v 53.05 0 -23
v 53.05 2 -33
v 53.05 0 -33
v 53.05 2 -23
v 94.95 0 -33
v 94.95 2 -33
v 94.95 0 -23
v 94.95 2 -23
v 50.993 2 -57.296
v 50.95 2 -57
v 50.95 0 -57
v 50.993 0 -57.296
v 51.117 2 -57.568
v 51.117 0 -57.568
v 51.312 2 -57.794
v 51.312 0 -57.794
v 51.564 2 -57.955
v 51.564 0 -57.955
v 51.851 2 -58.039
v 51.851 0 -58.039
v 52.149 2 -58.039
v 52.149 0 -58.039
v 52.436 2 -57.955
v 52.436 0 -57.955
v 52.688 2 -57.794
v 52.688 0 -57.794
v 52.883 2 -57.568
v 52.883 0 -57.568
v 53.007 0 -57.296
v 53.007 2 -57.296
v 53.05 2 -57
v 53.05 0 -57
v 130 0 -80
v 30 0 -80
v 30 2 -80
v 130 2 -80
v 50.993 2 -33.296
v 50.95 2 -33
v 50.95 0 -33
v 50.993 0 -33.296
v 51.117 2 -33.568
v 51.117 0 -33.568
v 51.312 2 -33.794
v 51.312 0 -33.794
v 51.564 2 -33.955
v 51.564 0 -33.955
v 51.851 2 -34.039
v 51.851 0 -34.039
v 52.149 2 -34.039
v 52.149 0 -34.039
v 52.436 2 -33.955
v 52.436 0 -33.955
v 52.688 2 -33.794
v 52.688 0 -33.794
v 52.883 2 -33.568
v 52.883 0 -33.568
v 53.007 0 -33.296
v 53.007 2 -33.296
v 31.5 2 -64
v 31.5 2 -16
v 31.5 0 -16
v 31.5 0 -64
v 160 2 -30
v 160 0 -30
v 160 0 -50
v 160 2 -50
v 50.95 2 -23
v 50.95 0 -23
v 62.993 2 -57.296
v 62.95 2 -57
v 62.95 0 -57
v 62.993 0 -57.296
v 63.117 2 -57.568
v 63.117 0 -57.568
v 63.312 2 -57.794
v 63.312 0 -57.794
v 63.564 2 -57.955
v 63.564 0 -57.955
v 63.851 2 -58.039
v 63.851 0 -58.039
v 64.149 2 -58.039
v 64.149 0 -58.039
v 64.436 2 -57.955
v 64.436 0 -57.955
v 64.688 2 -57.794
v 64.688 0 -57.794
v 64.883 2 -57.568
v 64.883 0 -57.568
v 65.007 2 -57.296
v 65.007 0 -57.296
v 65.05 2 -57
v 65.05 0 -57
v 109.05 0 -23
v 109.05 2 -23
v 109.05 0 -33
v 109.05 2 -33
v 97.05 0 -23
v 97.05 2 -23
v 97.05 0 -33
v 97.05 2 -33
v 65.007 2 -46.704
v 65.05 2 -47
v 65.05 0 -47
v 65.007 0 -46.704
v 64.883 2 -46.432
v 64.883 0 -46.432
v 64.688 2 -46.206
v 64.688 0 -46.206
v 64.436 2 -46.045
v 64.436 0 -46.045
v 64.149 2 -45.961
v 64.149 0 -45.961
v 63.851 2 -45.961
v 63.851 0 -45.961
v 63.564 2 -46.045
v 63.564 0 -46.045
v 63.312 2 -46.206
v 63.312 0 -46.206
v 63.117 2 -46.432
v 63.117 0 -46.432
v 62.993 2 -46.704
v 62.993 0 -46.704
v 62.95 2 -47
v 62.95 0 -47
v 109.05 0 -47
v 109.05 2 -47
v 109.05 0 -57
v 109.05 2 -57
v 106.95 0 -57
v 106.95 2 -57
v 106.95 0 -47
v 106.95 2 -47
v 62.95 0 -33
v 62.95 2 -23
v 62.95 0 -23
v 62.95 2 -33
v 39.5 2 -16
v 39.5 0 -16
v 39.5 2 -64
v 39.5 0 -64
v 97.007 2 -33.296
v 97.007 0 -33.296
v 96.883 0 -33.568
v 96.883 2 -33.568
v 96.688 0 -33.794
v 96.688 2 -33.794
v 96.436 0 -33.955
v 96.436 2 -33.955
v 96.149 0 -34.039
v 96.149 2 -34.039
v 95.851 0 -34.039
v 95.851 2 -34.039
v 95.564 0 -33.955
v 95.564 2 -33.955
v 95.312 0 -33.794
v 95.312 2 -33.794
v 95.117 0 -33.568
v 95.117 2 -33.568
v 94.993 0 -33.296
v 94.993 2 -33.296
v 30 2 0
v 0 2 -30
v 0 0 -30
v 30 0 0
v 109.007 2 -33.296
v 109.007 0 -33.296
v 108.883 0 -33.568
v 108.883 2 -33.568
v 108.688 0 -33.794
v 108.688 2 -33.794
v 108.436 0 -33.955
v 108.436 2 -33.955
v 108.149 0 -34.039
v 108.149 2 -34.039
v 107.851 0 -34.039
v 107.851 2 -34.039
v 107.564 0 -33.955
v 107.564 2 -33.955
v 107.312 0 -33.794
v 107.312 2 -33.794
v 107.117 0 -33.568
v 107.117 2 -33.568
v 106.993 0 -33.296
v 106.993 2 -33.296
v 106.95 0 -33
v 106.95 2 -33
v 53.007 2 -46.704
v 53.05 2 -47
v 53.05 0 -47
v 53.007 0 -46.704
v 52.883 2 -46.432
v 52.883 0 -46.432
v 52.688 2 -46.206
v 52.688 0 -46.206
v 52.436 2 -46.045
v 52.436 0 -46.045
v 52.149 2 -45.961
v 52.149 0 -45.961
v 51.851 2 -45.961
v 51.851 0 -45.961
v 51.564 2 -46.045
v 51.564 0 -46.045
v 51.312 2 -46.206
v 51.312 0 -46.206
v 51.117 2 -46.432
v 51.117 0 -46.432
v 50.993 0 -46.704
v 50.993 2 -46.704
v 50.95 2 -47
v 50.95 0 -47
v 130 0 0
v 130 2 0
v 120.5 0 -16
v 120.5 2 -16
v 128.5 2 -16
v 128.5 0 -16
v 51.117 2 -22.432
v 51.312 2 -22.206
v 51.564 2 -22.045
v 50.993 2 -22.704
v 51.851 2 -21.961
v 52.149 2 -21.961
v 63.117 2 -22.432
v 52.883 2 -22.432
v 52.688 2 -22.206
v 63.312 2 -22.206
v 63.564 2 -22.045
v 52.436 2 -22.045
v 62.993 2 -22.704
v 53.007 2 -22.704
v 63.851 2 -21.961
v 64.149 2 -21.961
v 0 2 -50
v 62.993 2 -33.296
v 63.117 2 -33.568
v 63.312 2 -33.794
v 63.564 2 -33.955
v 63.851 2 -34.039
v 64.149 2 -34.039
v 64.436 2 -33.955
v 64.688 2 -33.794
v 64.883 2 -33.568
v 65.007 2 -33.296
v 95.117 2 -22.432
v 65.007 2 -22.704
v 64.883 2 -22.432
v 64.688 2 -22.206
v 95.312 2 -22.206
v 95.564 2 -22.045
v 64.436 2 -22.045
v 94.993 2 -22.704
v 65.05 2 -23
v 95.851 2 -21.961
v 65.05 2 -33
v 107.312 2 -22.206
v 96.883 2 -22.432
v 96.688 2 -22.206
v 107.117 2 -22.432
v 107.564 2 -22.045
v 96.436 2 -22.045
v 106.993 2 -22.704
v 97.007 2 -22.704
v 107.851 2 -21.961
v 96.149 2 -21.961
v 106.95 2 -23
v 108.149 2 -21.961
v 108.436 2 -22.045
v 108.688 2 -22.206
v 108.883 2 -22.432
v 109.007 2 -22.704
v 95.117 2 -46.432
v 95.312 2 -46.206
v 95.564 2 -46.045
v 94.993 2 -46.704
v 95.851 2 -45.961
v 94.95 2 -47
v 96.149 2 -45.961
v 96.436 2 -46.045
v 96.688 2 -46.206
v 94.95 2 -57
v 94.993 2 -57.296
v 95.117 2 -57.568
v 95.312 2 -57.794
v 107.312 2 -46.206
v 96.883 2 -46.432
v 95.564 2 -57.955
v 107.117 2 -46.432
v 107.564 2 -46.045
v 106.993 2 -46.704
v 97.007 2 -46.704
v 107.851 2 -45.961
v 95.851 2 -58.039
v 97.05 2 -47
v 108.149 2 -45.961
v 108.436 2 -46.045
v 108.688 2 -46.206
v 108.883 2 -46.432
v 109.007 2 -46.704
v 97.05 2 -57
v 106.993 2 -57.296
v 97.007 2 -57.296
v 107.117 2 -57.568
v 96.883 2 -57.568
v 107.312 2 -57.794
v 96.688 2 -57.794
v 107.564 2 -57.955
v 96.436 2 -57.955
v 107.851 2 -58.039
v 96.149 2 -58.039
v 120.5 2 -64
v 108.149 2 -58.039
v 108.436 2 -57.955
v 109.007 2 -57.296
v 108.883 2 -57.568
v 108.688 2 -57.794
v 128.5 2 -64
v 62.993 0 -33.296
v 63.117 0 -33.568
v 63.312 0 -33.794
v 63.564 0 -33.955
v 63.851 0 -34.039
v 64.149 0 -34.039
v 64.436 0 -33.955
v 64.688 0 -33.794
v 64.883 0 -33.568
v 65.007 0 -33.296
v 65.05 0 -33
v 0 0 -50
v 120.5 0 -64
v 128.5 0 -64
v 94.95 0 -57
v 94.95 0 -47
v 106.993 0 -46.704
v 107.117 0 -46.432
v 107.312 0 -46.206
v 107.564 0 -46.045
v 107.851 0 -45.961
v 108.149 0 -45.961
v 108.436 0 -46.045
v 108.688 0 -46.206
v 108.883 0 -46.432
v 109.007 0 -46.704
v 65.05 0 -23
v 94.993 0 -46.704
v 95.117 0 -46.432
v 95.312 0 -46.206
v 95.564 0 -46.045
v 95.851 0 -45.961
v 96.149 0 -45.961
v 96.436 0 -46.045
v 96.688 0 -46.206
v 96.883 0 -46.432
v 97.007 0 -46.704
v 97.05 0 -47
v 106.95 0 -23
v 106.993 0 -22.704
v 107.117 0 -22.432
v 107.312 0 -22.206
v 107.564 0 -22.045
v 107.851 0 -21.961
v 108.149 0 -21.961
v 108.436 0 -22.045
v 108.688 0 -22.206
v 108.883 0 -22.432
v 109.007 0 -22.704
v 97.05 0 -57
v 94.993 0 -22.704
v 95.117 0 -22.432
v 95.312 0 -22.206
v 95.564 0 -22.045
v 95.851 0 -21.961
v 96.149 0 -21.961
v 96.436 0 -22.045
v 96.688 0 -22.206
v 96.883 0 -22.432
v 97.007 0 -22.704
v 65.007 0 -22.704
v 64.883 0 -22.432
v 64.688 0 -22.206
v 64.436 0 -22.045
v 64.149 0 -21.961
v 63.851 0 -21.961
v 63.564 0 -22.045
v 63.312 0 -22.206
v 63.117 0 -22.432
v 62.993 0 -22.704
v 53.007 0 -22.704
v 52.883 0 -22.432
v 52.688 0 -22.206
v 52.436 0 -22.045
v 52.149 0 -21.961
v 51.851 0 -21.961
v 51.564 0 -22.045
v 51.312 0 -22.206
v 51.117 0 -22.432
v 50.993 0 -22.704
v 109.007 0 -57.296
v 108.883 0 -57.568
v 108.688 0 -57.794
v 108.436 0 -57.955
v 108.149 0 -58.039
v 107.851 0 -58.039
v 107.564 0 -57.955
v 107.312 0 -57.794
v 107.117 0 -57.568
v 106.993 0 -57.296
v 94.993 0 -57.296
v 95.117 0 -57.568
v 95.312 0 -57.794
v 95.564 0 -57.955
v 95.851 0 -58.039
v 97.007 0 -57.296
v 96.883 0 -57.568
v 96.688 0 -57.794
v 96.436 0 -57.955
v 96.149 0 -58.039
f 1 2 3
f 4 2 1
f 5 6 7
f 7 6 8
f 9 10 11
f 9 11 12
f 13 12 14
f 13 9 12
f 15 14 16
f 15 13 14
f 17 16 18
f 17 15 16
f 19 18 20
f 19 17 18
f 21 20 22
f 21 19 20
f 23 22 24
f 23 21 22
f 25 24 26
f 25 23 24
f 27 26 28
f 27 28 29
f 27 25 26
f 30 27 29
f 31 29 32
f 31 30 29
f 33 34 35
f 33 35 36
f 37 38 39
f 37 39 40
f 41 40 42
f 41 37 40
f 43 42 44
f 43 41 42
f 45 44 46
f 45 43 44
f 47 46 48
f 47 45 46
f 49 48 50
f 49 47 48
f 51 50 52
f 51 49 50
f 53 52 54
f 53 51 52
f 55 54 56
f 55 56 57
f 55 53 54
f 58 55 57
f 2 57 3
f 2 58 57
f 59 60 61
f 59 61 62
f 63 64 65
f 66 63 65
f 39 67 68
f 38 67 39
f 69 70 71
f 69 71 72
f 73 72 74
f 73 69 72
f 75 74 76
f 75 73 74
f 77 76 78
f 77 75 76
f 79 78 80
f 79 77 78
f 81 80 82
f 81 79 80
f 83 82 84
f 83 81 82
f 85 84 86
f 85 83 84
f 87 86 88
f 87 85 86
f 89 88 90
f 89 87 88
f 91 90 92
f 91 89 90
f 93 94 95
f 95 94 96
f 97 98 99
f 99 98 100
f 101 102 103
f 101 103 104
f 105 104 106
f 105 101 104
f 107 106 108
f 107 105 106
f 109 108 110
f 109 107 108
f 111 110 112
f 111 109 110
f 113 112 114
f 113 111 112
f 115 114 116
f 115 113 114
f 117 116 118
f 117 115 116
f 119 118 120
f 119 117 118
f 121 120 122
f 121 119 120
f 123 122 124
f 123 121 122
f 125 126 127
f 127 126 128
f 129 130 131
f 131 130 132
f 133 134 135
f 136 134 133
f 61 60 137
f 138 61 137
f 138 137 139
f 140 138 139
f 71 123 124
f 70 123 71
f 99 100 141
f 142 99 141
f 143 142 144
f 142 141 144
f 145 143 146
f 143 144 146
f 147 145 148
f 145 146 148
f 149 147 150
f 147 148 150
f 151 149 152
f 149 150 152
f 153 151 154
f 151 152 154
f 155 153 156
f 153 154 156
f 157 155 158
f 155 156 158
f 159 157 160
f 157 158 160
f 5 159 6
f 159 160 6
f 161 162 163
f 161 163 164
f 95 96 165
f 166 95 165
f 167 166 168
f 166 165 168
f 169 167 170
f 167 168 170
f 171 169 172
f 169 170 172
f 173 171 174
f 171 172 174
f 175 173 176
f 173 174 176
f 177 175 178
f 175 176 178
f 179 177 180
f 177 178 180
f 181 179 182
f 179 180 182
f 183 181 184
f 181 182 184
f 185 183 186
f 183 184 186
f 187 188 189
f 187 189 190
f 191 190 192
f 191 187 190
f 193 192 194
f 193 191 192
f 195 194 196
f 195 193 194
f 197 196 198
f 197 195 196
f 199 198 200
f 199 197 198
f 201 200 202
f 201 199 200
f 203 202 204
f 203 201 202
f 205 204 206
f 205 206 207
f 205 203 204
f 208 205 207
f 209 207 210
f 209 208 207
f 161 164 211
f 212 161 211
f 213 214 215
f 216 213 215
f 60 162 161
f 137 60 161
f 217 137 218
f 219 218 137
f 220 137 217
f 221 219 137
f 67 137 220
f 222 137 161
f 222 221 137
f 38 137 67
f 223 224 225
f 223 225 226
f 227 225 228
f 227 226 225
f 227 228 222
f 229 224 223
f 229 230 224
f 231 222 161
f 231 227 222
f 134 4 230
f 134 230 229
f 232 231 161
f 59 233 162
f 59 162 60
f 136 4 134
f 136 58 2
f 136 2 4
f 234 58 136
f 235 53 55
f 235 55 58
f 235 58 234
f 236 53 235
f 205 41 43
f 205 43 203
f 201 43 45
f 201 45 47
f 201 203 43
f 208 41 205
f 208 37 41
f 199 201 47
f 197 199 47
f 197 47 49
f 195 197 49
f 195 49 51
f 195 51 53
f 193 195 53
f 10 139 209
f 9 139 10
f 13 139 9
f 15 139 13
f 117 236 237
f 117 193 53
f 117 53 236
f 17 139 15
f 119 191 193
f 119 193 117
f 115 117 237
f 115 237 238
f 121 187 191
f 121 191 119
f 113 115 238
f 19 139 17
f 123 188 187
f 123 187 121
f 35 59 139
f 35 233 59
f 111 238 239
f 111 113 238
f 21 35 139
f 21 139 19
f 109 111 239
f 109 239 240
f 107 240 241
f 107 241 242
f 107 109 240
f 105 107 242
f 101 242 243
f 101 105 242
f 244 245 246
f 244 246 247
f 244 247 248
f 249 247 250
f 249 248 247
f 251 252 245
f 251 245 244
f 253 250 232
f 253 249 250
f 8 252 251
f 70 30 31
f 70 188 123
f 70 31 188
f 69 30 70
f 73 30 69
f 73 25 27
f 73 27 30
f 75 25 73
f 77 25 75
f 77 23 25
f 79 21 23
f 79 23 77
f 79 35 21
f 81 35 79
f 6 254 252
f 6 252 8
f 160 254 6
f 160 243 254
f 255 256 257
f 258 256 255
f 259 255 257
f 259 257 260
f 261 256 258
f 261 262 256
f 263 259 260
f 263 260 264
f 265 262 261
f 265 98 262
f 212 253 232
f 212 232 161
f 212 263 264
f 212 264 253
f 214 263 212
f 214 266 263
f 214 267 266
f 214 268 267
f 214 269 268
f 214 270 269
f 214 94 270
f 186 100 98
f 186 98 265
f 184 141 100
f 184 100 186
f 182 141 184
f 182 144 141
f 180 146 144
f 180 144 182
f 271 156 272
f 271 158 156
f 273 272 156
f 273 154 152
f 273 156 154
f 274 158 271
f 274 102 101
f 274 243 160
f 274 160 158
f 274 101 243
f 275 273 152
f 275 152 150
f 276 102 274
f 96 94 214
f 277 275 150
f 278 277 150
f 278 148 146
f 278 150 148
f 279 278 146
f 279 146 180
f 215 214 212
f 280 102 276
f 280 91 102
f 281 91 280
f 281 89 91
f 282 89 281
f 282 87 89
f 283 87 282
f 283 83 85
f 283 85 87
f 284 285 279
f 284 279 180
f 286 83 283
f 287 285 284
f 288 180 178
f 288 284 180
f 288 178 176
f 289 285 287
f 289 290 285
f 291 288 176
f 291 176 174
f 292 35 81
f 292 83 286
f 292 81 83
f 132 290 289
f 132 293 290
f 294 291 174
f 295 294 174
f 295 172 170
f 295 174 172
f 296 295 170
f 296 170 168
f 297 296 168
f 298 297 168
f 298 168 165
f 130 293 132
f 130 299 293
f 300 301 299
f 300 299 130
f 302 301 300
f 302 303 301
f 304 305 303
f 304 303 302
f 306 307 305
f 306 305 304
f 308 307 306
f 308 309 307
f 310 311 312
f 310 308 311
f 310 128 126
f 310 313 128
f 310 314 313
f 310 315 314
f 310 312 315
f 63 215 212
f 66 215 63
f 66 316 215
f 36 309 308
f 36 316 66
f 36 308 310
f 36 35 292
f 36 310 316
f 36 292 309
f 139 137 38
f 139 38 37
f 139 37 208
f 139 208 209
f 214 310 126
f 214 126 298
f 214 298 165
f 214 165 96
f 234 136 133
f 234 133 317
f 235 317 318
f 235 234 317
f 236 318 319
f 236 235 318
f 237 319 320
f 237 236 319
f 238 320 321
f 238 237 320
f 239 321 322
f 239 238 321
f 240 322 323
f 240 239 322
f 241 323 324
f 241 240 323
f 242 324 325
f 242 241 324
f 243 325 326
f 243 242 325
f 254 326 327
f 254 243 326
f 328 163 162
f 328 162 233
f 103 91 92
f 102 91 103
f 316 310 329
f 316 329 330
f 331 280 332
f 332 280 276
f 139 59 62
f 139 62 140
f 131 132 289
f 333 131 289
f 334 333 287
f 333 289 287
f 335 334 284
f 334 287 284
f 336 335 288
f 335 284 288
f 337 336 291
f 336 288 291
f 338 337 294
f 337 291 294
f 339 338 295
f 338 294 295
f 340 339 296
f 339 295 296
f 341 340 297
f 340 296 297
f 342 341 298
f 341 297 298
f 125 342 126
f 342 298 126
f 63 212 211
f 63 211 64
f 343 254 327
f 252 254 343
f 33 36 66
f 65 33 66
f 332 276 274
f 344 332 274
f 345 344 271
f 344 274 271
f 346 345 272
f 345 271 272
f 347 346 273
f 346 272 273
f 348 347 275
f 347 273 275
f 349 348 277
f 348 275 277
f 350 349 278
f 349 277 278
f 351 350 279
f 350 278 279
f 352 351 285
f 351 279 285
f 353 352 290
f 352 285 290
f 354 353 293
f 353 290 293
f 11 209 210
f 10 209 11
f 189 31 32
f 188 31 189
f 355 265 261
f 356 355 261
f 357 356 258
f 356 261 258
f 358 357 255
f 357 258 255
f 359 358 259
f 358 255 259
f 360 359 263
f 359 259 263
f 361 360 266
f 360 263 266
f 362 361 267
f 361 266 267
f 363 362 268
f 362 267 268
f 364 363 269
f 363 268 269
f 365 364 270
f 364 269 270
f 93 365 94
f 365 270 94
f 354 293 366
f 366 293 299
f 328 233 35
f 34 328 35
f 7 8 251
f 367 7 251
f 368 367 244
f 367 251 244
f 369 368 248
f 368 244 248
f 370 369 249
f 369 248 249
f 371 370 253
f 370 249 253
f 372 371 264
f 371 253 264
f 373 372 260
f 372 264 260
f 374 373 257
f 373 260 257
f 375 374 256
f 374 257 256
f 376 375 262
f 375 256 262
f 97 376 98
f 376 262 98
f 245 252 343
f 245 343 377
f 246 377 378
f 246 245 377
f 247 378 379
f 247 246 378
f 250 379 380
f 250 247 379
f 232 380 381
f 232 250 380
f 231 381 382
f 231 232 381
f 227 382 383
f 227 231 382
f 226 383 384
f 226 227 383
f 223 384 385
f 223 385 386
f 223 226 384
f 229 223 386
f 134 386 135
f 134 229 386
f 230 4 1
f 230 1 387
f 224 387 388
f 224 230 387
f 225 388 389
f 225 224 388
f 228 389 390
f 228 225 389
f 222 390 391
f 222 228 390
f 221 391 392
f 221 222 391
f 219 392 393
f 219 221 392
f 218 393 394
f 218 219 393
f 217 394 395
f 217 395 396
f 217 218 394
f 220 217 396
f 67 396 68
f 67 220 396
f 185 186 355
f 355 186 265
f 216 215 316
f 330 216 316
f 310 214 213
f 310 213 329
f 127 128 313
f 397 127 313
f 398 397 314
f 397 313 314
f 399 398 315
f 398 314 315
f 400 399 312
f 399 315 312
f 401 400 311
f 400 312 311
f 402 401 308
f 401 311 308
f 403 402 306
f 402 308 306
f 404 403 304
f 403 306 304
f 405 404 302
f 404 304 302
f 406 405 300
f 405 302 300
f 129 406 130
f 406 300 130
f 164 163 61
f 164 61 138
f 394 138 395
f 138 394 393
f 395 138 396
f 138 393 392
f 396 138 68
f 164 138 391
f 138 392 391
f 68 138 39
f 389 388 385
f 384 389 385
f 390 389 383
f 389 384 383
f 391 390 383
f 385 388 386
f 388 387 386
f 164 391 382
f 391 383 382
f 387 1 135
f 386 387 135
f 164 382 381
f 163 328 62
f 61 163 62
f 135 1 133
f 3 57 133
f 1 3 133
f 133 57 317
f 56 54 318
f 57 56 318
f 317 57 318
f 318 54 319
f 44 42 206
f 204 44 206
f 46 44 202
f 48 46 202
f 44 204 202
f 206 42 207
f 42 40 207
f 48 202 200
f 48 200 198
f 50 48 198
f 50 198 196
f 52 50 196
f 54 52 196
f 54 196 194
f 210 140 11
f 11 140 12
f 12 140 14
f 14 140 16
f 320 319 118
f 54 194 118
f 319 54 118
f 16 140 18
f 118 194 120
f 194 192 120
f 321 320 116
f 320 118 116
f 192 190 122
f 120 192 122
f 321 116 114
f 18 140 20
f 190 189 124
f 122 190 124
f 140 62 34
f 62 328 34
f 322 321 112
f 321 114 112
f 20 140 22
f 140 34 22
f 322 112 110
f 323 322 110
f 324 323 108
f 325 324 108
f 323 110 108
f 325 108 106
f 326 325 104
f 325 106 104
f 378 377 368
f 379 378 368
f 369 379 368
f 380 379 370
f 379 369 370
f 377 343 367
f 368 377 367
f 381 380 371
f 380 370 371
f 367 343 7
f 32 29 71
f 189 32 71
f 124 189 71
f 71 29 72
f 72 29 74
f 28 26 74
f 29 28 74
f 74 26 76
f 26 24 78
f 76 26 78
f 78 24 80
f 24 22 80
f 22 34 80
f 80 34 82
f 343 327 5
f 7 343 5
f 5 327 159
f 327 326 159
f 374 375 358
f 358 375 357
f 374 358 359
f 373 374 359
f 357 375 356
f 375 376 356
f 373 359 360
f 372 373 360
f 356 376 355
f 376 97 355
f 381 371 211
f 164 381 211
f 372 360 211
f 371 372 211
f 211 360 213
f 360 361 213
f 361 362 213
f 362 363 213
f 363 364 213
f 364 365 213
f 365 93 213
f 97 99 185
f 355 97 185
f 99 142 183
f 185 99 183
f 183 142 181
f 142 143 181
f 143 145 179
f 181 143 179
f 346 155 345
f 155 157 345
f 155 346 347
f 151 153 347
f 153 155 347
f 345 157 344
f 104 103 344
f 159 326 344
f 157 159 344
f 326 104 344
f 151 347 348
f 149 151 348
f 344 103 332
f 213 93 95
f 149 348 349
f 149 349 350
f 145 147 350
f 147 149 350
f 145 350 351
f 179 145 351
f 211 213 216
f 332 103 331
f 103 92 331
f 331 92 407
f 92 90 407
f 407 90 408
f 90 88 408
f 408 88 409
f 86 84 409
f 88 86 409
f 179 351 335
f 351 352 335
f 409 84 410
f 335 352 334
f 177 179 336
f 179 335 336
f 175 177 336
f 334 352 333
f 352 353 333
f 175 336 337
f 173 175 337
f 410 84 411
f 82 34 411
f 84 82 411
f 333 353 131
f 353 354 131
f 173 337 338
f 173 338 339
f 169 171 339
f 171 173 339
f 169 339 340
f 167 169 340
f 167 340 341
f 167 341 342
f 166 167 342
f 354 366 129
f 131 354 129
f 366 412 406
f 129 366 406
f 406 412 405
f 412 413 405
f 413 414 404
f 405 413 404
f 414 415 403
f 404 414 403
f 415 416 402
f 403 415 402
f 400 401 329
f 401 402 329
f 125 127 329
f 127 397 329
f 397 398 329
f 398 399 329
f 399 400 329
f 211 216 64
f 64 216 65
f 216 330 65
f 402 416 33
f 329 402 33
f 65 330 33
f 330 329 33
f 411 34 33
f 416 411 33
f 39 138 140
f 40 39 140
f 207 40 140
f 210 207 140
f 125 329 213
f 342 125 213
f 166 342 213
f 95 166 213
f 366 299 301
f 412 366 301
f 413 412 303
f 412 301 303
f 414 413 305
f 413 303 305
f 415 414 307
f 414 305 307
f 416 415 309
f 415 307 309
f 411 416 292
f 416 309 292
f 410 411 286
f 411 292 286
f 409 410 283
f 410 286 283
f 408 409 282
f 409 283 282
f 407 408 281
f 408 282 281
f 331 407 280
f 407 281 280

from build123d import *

# Parameters (mm, degrees)
ESQUISSE1_W             = 160
ESQUISSE1_H             = 80
BOSS_EXTRU_1_DEPTH      = 2
ENL_V_MAT_EXTRU_2_DEPTH = 2
ENL_V_MAT_EXTRU_3_DEPTH = 2
ENL_V_MAT_EXTRU_4_REACH = 4
ESQUISSE8_W             = 8
ESQUISSE8_H             = 48


with BuildPart() as part:
    # Esquisse1 → Boss.-Extru.1 (new body)
    with BuildSketch(Plane(origin=(0, 0, 0), x_dir=(1, 0, 0), z_dir=(0, 1, 0))):
        with Locations((80, 40)):
            Rectangle(ESQUISSE1_W, ESQUISSE1_H)
    extrude(amount=BOSS_EXTRU_1_DEPTH)

    # Esquisse2 → Enlèv. mat.-Extru.2 (cut)
    with BuildSketch(Plane(origin=(0, 2, 0), x_dir=(1, 0, 0), z_dir=(0, 1, 0))):
        Polygon((0, 50), (30, 80), (0, 80), align=None)
        Polygon((130, 80), (160, 50), (160, 80), align=None)
        Polygon((130, 0), (160, 30), (160, 0), align=None)
        Polygon((0, 30), (30, 0), (0, 0), align=None)
    extrude(amount=-ENL_V_MAT_EXTRU_2_DEPTH, mode=Mode.SUBTRACT)

    # Esquisse7 → Enlèv. mat.-Extru.3 (cut)
    with BuildSketch(Plane(origin=(0, 2, 0), x_dir=(1, 0, 0), z_dir=(0, 1, 0))):
        with BuildLine():
            Line((62.95, 23), (62.95, 33))
            ThreePointArc((62.95, 33), (64, 34.05), (65.05, 33))
            Line((65.05, 33), (65.05, 23))
            ThreePointArc((65.05, 23), (64, 21.95), (62.95, 23))
        make_face()
        with BuildLine():
            Line((50.95, 23), (50.95, 33))
            ThreePointArc((50.95, 33), (52, 34.05), (53.05, 33))
            Line((53.05, 33), (53.05, 23))
            ThreePointArc((53.05, 23), (52, 21.95), (50.95, 23))
        make_face()
        with BuildLine():
            Line((50.95, 47), (50.95, 57))
            ThreePointArc((50.95, 57), (52, 58.05), (53.05, 57))
            Line((53.05, 57), (53.05, 47))
            ThreePointArc((53.05, 47), (52, 45.95), (50.95, 47))
        make_face()
        with BuildLine():
            Line((62.95, 47), (62.95, 57))
            ThreePointArc((62.95, 57), (64, 58.05), (65.05, 57))
            Line((65.05, 57), (65.05, 47))
            ThreePointArc((65.05, 47), (64, 45.95), (62.95, 47))
        make_face()
        with BuildLine():
            Line((97.05, 47), (97.05, 57))
            ThreePointArc((97.05, 57), (96, 58.05), (94.95, 57))
            Line((94.95, 57), (94.95, 47))
            ThreePointArc((94.95, 47), (96, 45.95), (97.05, 47))
        make_face()
        with BuildLine():
            Line((109.05, 47), (109.05, 57))
            ThreePointArc((109.05, 57), (108, 58.05), (106.95, 57))
            Line((106.95, 57), (106.95, 47))
            ThreePointArc((106.95, 47), (108, 45.95), (109.05, 47))
        make_face()
        with BuildLine():
            Line((109.05, 23), (109.05, 33))
            ThreePointArc((109.05, 33), (108, 34.05), (106.95, 33))
            Line((106.95, 33), (106.95, 23))
            ThreePointArc((106.95, 23), (108, 21.95), (109.05, 23))
        make_face()
        with BuildLine():
            Line((97.05, 23), (97.05, 33))
            ThreePointArc((97.05, 33), (96, 34.05), (94.95, 33))
            Line((94.95, 33), (94.95, 23))
            ThreePointArc((94.95, 23), (96, 21.95), (97.05, 23))
        make_face()
    extrude(amount=-ENL_V_MAT_EXTRU_3_DEPTH, mode=Mode.SUBTRACT)

    # Esquisse8 → Enlèv. mat.-Extru.4 (cut, up to next)
    with BuildSketch(Plane(origin=(0, 2, 0), x_dir=(1, 0, 0), z_dir=(0, 1, 0)), mode=Mode.PRIVATE) as enl_v_mat_extru_4_sk1:
        with Locations((124.5, 40)):
            Rectangle(ESQUISSE8_W, ESQUISSE8_H)
    enl_v_mat_extru_4_tool1 = extrude(enl_v_mat_extru_4_sk1.sketch, amount=-ENL_V_MAT_EXTRU_4_REACH, mode=Mode.PRIVATE) & part.part
    add(enl_v_mat_extru_4_tool1.solids().sort_by_distance((124.5, 2, -40))[0], mode=Mode.SUBTRACT)
    # Esquisse8 → Enlèv. mat.-Extru.4 (cut, up to next)
    with BuildSketch(Plane(origin=(0, 2, 0), x_dir=(1, 0, 0), z_dir=(0, 1, 0)), mode=Mode.PRIVATE) as enl_v_mat_extru_4_sk2:
        with Locations((35.5, 40)):
            Rectangle(ESQUISSE8_W, ESQUISSE8_H)
    enl_v_mat_extru_4_tool2 = extrude(enl_v_mat_extru_4_sk2.sketch, amount=-ENL_V_MAT_EXTRU_4_REACH, mode=Mode.PRIVATE) & part.part
    add(enl_v_mat_extru_4_tool2.solids().sort_by_distance((35.5, 2, -40))[0], mode=Mode.SUBTRACT)


solid = part.part
